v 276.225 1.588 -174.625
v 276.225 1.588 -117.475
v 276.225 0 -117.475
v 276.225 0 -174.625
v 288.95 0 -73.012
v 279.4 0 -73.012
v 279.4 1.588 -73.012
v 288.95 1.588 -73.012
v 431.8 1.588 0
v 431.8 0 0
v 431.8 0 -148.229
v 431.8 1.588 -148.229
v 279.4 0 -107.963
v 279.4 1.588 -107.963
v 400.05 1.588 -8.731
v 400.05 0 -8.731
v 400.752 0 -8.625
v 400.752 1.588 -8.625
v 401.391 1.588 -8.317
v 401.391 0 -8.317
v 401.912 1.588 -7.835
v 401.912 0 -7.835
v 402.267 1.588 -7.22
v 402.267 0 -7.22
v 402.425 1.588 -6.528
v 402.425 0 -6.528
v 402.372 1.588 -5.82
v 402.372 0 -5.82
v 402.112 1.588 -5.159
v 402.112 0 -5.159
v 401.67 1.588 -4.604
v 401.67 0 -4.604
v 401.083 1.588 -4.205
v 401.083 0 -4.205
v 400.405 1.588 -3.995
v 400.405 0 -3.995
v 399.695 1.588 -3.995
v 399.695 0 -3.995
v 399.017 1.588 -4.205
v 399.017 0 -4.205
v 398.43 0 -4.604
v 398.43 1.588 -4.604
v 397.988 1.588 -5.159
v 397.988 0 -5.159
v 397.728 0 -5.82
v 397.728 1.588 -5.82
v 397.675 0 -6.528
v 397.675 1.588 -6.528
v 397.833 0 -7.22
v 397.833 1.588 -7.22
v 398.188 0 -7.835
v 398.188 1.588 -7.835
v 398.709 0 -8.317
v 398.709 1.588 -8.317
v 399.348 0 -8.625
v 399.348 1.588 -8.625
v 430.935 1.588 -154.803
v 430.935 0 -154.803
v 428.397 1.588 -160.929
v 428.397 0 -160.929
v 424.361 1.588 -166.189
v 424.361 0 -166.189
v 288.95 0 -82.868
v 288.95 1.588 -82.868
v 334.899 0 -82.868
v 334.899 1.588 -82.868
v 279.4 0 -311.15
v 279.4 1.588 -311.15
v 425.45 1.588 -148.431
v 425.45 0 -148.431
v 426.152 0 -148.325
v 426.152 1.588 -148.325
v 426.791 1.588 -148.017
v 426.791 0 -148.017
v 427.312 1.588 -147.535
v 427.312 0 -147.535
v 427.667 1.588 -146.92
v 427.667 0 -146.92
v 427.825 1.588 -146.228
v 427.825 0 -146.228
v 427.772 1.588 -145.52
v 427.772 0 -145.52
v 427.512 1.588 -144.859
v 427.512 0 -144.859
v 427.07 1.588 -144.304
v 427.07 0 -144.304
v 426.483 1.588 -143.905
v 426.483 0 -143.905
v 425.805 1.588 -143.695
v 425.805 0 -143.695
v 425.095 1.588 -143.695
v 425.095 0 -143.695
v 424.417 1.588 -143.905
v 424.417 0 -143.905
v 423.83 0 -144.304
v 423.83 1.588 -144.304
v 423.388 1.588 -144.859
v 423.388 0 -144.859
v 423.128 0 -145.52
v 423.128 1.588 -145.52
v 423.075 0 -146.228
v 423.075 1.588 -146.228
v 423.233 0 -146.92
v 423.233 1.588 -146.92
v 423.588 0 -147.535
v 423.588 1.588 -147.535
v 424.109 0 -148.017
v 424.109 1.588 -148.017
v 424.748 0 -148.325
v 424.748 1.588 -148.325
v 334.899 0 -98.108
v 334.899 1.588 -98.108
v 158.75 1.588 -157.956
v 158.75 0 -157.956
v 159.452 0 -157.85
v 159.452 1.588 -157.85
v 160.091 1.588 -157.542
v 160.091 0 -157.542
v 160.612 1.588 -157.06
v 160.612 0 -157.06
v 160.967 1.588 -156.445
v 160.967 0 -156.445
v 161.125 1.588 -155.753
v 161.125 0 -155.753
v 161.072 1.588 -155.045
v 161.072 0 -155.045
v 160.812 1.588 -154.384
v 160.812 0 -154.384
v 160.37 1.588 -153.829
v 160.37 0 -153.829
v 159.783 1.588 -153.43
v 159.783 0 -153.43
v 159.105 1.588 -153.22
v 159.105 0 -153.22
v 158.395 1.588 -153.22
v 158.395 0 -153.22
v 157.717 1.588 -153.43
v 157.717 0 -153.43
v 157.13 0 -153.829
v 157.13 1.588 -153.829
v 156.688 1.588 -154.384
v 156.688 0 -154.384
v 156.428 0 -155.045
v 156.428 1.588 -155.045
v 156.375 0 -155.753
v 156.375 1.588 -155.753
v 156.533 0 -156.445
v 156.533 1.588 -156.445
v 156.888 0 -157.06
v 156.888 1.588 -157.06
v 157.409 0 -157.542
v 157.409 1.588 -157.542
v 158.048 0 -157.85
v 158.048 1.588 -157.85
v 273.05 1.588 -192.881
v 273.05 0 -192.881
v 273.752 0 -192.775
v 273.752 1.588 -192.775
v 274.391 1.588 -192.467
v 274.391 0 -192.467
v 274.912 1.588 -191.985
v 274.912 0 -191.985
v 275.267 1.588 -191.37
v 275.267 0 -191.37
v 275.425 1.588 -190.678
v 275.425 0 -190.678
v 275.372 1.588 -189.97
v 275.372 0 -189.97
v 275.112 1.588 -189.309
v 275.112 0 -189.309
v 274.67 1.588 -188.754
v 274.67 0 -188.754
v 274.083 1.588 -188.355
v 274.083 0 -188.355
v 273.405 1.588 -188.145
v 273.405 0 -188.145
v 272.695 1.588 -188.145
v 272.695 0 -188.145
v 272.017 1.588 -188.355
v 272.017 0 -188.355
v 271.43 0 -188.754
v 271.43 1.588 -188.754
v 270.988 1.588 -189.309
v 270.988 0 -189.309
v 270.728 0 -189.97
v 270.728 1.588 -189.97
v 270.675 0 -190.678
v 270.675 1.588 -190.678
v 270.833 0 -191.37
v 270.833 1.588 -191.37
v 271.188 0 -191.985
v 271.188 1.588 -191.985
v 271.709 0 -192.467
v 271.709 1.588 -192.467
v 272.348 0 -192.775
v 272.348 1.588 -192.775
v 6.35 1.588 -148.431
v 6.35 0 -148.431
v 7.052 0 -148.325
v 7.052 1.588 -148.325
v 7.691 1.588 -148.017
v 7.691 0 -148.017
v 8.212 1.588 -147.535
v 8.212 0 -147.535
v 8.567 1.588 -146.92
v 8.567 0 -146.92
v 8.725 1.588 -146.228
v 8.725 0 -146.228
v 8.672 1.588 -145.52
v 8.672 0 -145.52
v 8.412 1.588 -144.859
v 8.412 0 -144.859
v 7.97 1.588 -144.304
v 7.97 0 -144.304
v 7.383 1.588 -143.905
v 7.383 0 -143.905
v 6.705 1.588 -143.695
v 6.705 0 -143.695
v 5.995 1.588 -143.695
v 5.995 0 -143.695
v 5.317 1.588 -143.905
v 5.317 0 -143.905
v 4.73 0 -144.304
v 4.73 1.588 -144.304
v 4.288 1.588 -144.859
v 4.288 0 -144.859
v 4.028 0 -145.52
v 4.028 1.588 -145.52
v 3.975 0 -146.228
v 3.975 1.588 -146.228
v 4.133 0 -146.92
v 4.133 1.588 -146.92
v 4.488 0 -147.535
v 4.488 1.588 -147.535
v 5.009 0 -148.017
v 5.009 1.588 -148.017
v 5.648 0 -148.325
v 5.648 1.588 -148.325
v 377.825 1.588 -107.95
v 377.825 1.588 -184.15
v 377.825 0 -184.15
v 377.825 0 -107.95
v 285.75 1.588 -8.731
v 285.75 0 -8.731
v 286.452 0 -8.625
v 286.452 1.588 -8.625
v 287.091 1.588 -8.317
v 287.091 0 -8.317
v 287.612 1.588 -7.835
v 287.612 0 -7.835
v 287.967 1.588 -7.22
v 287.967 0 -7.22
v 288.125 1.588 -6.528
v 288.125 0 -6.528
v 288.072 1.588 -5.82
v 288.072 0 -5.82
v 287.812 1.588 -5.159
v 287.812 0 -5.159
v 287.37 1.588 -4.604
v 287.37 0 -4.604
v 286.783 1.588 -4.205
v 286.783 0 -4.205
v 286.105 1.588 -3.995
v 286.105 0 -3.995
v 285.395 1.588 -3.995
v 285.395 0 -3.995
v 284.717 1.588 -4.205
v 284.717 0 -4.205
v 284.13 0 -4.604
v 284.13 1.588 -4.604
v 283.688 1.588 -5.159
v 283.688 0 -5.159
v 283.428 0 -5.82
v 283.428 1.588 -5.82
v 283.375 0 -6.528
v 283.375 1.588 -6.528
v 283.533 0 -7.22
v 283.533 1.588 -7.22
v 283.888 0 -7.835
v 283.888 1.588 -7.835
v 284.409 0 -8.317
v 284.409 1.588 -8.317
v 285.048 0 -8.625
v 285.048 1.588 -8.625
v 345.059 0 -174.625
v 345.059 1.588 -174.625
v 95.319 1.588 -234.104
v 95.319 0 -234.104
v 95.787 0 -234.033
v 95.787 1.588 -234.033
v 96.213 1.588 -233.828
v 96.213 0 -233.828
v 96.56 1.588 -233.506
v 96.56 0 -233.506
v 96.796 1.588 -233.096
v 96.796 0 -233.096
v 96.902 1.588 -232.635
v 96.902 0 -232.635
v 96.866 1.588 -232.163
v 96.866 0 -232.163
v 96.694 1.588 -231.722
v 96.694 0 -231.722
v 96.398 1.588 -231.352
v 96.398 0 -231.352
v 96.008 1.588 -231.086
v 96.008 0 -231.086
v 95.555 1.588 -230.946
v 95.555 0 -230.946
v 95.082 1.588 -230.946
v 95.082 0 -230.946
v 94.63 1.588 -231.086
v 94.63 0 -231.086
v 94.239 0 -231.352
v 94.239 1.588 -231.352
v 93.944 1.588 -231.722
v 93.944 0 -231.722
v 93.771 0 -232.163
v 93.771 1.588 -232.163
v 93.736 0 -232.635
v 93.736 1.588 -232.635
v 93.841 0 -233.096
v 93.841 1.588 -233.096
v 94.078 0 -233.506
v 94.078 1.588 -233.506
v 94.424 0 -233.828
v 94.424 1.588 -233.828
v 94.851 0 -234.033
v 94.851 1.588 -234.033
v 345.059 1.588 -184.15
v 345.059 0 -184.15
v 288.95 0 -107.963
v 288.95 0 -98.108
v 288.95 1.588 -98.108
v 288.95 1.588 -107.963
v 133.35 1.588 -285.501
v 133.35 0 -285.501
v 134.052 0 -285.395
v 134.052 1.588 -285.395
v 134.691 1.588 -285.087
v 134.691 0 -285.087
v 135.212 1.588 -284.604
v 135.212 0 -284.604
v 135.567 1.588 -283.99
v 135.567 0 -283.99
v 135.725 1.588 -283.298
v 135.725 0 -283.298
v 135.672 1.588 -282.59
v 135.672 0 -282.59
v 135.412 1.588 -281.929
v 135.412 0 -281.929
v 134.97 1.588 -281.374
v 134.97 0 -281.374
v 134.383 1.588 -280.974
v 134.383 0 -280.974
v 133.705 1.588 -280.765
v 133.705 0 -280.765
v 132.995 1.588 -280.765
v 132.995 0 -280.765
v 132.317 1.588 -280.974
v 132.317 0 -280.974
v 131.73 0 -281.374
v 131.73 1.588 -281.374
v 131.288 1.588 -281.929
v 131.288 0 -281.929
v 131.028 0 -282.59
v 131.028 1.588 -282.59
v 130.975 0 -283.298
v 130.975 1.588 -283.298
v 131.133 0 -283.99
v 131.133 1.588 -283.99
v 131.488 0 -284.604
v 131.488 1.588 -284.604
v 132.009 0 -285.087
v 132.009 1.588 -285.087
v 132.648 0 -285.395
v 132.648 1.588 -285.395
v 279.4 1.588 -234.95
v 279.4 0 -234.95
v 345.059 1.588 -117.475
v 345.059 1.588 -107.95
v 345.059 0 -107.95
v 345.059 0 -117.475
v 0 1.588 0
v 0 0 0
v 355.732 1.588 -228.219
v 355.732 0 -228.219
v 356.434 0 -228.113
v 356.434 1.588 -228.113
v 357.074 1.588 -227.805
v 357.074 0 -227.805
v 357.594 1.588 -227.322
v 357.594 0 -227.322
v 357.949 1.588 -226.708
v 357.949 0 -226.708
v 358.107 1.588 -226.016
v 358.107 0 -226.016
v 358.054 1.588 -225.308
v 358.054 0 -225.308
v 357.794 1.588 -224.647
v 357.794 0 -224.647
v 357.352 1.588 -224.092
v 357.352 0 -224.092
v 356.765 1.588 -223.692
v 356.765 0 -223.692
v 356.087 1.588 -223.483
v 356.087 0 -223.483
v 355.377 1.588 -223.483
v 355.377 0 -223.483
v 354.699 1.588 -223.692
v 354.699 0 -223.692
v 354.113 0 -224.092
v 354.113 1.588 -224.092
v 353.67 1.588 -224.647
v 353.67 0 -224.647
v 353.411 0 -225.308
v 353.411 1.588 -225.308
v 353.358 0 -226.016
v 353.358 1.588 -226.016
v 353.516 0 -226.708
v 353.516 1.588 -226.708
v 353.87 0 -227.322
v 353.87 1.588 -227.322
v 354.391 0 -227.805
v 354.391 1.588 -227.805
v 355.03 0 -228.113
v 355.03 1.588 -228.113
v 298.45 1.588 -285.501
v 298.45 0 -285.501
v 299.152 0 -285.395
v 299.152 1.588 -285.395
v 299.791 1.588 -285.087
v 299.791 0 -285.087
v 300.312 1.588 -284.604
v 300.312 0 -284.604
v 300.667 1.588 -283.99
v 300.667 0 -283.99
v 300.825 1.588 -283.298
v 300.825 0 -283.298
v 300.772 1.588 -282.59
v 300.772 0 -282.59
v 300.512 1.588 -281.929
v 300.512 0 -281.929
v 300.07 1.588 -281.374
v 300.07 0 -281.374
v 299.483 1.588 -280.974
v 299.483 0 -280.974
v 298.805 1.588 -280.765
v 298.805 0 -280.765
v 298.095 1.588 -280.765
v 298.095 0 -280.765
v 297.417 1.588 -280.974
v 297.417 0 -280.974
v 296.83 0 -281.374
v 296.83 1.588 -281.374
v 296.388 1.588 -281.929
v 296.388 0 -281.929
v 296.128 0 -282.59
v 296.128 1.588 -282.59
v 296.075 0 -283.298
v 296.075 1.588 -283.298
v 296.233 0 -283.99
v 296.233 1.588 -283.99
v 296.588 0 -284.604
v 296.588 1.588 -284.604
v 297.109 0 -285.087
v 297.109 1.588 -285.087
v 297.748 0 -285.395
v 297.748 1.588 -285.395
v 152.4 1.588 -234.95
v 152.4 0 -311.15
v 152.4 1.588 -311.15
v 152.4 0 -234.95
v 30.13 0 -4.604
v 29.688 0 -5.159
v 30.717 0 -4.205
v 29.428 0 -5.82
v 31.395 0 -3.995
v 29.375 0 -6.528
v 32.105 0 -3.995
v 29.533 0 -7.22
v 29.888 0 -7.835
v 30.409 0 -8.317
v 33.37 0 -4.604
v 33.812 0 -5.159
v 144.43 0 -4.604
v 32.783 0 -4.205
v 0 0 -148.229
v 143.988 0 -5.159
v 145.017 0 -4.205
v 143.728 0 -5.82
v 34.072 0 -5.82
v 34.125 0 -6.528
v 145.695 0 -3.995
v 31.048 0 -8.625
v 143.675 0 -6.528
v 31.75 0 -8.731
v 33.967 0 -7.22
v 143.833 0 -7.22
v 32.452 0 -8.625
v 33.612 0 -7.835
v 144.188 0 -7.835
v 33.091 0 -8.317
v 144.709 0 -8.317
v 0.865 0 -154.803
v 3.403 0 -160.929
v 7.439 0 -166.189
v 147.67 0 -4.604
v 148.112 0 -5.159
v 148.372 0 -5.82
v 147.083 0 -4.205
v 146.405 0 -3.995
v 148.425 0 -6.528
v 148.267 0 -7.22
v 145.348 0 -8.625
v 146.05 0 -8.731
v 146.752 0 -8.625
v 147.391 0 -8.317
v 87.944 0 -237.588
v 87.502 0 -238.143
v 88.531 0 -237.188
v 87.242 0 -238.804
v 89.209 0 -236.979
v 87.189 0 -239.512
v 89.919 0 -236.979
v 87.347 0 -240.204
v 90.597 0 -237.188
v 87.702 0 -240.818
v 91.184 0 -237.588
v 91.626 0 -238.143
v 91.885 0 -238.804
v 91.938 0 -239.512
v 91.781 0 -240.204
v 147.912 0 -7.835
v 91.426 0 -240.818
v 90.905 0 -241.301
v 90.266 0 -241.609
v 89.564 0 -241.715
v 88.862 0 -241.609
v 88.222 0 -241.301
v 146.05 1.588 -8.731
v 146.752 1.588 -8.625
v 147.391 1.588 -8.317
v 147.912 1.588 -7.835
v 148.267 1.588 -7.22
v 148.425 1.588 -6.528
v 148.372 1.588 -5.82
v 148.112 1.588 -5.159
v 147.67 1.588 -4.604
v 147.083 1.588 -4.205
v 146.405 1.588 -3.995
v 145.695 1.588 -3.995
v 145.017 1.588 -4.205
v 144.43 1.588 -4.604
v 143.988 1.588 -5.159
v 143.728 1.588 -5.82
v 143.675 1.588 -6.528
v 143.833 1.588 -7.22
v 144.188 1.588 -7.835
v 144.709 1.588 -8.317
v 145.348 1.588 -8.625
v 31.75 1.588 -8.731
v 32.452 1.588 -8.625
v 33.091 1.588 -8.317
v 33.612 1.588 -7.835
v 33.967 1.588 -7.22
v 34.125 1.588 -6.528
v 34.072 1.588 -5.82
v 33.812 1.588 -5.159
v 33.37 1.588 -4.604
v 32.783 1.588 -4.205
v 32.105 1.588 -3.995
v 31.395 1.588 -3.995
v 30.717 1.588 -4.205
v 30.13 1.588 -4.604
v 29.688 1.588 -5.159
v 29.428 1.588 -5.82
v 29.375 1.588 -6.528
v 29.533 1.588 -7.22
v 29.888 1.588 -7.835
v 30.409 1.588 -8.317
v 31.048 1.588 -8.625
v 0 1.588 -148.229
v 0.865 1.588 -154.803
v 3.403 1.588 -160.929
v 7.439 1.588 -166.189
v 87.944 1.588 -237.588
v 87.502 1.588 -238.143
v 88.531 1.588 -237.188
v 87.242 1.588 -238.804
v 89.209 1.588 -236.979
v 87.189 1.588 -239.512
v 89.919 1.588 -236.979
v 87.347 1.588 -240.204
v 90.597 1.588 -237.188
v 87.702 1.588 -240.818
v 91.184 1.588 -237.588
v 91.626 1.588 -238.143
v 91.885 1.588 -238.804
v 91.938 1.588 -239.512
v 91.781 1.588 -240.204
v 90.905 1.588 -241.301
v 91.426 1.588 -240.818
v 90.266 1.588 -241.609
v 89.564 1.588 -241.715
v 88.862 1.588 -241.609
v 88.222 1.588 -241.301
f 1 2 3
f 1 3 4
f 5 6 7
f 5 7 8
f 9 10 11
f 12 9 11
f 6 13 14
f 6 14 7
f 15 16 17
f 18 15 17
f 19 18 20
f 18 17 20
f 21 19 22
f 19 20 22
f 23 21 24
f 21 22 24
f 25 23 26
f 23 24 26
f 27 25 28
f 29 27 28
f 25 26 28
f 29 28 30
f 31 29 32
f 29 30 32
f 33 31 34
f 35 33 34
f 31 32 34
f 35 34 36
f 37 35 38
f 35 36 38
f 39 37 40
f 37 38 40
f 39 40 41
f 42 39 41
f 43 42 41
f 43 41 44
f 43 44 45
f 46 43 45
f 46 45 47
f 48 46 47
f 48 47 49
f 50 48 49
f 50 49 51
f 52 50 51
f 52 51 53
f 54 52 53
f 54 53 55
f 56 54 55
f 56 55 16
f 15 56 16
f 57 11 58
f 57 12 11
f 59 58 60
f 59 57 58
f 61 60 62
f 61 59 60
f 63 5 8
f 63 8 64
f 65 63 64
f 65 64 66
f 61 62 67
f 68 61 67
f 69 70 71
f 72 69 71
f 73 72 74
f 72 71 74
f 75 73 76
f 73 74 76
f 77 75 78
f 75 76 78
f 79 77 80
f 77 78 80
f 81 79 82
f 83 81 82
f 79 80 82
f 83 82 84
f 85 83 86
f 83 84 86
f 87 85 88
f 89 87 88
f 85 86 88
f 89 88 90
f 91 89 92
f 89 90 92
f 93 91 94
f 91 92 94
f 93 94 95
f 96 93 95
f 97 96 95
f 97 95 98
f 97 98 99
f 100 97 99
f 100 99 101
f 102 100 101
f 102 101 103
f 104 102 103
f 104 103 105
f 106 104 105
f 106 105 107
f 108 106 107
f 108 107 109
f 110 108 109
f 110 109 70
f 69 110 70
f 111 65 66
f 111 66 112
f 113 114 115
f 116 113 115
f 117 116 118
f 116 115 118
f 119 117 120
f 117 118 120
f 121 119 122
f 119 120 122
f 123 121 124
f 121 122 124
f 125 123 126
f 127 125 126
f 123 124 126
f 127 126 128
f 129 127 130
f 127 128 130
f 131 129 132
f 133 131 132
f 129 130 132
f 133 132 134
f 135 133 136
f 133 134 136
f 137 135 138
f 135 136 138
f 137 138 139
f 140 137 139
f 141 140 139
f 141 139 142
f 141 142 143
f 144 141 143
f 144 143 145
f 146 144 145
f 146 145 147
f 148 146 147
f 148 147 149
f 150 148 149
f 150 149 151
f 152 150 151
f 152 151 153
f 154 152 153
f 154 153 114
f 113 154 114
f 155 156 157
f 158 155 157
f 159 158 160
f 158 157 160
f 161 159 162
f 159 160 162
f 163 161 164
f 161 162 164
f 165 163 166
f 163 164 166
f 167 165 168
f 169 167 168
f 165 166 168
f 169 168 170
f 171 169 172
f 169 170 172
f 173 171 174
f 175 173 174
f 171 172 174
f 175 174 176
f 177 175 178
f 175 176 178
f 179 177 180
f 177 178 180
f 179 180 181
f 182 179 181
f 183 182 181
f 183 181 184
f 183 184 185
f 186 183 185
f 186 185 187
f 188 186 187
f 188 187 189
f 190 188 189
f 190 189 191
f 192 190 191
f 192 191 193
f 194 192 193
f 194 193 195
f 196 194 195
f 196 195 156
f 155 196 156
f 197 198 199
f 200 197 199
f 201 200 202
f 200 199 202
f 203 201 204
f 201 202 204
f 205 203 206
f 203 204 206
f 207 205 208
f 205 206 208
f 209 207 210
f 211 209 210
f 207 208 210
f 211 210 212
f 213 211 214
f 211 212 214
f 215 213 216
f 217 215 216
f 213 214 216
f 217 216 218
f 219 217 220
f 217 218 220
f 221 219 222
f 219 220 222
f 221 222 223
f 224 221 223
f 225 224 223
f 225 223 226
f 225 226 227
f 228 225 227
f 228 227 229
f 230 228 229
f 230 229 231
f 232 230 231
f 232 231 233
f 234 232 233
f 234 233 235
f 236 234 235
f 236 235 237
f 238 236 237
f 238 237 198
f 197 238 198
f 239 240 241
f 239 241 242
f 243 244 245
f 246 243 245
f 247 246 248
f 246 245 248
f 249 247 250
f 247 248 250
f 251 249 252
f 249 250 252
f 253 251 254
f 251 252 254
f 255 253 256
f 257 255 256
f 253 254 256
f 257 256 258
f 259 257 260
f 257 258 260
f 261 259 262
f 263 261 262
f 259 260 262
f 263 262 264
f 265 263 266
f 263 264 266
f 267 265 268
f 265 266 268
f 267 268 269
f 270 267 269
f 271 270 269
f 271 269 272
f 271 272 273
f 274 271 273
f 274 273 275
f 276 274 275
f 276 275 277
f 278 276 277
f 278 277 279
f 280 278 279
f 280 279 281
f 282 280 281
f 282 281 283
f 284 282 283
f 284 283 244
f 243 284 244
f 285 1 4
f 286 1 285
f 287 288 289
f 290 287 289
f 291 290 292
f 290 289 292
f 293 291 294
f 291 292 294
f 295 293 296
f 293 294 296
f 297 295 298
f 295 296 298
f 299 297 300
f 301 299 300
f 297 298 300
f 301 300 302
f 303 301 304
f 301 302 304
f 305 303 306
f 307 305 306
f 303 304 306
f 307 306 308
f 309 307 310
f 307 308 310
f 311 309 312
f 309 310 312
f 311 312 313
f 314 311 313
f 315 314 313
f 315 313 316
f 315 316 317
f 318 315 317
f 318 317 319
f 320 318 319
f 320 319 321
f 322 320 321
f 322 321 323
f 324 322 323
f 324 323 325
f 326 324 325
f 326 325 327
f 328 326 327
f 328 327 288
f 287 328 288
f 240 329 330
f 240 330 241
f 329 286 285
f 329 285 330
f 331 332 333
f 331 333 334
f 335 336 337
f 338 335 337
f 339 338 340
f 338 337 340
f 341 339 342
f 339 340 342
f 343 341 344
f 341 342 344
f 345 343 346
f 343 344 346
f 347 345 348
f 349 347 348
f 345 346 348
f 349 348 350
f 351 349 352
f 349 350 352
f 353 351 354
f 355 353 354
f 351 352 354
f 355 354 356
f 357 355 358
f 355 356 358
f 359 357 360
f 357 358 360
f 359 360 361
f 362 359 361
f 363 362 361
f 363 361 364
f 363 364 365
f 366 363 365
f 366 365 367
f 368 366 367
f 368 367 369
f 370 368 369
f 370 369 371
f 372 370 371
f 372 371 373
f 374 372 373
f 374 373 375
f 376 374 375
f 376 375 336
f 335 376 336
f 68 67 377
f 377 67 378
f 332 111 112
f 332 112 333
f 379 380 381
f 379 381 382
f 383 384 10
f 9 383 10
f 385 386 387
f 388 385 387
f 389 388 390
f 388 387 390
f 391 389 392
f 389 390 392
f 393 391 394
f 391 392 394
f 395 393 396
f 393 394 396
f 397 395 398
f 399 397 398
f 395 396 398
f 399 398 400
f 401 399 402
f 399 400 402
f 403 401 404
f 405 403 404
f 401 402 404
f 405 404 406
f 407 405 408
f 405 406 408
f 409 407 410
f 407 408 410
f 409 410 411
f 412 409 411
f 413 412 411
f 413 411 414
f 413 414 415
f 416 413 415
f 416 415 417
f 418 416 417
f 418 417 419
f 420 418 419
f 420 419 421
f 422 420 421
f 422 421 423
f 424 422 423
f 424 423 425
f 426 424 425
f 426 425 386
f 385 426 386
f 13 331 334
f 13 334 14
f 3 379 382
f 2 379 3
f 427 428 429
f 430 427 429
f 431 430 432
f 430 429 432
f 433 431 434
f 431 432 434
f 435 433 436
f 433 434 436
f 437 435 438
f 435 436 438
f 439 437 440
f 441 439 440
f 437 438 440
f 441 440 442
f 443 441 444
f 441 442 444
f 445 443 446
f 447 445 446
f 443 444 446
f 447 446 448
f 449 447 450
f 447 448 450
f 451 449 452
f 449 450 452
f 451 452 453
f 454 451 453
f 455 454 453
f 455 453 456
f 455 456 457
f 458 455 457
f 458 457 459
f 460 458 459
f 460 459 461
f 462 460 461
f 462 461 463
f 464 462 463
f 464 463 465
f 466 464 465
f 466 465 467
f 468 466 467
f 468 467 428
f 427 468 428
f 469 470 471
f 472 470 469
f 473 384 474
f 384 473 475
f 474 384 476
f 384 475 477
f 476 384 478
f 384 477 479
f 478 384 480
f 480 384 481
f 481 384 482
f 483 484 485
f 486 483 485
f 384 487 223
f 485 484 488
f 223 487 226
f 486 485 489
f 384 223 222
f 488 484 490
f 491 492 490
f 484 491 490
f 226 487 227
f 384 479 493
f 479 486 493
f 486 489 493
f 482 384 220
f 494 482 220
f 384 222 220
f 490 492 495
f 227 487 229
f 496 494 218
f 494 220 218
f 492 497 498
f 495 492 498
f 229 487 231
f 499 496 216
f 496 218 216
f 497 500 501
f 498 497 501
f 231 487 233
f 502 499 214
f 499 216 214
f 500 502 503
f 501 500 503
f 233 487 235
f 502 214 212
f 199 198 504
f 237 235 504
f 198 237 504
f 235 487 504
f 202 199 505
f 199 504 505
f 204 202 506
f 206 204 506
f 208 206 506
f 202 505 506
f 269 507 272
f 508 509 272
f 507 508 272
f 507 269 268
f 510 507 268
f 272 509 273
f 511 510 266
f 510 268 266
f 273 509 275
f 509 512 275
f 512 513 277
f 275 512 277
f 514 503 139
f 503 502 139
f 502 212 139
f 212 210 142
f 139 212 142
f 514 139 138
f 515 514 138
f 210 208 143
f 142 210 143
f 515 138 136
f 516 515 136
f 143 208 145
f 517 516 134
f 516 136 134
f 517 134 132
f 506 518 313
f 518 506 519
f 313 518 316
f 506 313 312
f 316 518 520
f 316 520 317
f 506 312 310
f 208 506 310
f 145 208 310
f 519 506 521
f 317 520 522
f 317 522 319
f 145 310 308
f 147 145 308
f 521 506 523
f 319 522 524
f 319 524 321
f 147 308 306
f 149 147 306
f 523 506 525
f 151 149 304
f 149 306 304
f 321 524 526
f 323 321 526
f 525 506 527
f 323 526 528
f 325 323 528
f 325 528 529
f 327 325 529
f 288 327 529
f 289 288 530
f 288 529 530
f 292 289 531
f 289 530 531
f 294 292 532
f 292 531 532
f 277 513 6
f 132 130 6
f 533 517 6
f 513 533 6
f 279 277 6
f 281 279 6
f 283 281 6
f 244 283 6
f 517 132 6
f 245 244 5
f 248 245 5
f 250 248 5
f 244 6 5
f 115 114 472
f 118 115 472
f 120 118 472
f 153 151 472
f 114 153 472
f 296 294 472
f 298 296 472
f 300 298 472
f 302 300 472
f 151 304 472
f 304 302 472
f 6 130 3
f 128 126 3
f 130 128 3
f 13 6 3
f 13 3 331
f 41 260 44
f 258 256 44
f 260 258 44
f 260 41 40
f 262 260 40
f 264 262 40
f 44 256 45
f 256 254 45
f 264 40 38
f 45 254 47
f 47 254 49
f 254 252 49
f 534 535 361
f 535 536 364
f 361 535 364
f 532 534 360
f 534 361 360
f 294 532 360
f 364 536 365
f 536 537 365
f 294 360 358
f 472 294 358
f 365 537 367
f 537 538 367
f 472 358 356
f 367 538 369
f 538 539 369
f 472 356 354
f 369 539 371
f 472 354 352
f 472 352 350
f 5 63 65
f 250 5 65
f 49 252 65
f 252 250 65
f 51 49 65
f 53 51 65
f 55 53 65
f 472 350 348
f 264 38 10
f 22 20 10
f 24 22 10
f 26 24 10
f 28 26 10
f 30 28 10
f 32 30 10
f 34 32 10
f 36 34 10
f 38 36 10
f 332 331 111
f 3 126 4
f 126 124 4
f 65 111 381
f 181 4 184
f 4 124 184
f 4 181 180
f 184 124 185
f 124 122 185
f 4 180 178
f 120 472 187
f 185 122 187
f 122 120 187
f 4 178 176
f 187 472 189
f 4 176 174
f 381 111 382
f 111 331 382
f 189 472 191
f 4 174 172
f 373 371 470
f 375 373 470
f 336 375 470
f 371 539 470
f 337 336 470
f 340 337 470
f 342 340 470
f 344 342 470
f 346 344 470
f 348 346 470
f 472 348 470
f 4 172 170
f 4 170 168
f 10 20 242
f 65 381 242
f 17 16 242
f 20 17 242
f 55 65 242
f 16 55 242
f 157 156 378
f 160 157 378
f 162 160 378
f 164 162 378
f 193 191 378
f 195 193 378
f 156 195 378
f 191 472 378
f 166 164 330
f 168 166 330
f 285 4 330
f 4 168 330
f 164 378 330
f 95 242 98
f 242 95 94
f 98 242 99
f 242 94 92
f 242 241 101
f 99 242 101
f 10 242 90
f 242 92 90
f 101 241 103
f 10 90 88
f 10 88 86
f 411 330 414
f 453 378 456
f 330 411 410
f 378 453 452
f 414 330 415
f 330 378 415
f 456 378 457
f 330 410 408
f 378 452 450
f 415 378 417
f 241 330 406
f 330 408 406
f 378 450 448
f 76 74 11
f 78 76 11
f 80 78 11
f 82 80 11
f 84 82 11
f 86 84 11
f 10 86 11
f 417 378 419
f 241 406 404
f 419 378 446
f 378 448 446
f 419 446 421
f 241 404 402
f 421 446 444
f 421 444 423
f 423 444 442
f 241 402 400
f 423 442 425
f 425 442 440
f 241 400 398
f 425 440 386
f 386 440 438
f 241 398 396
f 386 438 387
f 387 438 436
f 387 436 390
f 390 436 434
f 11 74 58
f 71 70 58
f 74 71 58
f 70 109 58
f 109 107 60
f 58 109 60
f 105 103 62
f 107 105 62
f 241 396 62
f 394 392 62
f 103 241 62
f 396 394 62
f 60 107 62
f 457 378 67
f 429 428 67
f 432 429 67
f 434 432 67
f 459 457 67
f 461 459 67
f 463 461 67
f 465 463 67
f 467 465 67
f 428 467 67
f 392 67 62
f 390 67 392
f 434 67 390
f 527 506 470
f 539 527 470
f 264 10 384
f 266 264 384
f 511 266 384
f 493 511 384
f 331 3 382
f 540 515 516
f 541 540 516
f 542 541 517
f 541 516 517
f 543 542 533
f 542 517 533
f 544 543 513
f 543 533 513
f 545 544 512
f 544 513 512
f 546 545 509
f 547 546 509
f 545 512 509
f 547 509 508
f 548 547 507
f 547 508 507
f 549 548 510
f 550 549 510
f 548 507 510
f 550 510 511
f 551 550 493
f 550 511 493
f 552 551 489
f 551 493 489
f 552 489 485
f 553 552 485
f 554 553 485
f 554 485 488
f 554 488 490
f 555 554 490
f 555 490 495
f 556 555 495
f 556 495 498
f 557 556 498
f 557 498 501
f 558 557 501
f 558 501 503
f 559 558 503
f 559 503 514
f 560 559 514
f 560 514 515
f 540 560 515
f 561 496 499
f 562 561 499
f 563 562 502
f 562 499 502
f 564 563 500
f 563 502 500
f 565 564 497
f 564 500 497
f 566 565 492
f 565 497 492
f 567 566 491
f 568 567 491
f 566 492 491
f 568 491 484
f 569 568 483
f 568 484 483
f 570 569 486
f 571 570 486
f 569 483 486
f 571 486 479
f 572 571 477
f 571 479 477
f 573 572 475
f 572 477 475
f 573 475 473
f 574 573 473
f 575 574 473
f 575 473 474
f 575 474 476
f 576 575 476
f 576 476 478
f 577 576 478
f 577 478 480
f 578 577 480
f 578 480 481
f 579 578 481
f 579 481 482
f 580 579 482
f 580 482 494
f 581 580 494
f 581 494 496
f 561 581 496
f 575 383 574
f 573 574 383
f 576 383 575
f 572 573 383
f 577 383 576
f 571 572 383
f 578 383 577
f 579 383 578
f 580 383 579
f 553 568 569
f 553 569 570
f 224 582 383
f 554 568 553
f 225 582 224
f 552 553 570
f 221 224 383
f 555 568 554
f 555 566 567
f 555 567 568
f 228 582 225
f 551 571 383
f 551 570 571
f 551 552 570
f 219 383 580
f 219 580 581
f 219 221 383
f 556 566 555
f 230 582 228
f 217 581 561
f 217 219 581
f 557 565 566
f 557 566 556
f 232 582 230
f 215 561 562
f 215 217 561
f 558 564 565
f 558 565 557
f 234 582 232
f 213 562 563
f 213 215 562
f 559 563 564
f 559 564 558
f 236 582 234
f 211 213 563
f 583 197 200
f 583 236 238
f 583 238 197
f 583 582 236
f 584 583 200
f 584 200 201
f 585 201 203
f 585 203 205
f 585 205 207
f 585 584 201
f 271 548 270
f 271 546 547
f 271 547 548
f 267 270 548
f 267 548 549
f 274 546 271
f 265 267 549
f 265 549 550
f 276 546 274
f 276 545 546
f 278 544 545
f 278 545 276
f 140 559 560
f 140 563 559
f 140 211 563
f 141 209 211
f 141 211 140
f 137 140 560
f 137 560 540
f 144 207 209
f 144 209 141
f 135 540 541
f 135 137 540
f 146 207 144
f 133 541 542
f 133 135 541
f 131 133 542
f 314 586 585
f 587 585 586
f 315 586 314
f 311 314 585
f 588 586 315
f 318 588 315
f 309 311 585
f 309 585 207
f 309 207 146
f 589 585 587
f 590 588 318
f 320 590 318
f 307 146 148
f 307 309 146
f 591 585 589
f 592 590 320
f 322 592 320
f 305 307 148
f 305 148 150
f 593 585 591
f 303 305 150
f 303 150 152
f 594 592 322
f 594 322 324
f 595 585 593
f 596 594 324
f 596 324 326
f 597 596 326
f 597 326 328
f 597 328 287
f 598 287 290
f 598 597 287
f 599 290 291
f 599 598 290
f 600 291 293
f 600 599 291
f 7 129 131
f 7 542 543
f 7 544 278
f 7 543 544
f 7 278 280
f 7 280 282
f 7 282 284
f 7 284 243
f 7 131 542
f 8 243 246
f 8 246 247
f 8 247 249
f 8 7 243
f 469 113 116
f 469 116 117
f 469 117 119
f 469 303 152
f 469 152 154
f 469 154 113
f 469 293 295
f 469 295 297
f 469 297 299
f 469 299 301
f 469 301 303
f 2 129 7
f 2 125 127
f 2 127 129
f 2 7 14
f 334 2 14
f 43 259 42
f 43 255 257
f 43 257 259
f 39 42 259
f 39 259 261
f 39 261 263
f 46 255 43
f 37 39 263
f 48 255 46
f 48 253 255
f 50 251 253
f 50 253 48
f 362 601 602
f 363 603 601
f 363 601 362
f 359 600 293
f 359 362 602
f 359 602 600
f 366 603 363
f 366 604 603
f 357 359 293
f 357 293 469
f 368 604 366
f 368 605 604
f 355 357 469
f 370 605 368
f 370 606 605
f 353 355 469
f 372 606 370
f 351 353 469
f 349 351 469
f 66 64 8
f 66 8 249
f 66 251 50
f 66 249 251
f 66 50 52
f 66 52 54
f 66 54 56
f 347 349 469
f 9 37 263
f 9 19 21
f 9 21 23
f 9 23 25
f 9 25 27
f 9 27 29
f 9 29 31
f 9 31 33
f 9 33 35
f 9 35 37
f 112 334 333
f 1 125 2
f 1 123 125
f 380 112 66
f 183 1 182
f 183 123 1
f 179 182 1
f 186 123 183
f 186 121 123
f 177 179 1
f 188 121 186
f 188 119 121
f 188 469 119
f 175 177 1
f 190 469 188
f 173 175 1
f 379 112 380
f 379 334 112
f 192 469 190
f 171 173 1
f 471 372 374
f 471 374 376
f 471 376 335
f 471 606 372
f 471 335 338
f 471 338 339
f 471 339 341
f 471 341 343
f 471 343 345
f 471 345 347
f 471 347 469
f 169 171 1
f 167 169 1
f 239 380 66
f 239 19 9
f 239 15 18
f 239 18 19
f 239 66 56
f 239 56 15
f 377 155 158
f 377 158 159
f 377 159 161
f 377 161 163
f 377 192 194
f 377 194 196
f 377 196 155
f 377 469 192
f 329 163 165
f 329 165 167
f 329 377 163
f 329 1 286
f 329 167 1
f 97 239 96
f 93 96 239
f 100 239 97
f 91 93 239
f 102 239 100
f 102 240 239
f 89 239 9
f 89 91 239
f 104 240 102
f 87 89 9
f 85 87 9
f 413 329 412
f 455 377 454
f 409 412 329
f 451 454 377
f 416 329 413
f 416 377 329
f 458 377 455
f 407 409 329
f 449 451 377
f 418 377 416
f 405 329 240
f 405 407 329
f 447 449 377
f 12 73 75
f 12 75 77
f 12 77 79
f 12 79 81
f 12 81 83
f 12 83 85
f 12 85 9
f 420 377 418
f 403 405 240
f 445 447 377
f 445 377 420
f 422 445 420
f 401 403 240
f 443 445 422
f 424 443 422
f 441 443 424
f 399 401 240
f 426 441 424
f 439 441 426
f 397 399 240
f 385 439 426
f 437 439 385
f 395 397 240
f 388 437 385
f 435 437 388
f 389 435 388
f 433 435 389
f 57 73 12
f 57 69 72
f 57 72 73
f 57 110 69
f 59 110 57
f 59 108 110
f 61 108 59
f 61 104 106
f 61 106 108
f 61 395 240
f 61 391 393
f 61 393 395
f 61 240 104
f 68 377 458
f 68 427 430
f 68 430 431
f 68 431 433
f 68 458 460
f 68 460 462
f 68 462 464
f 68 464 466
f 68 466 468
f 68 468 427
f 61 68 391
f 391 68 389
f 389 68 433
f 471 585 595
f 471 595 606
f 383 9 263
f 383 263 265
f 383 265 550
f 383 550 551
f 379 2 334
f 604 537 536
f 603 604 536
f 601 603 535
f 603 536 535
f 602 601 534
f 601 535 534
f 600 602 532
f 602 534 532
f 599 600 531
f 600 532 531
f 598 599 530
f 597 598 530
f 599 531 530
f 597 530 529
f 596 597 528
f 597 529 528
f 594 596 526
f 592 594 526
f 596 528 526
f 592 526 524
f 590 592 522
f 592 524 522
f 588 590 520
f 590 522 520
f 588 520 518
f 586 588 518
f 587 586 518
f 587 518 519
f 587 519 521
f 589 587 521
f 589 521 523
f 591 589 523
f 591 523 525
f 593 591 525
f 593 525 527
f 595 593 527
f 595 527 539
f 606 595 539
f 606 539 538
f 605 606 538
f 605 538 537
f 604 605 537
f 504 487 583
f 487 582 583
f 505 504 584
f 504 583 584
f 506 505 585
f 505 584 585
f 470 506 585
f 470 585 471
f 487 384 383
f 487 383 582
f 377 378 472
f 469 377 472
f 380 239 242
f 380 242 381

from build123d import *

# Parameters (mm, degrees)
EXTRUDE1_DEPTH     = 1.5875
MIRROR1_DEPTH      = 1.5875
CUT_EXTRUDE1_REACH = 534.229
SKETCH3_R          = 1.5875
CUT_EXTRUDE2_DEPTH = 533.229351555
SKETCH4_R          = 2.38125
SKETCH4_R_2        = 2.381250001
CUT_EXTRUDE3_DEPTH = 533.229351555
CUT_EXTRUDE4_DEPTH = 533.229351555
FILLET1_R          = 25.4


# Read off the part's stored shape, not the designer's step: Mirror1
with BuildPart() as part:
    # Sketch1 → Extrude1 (new body)
    with BuildSketch(Plane(origin=(0, 0, 0), x_dir=(1, 0, 0), z_dir=(0, 1, 0))):
        Polygon((0, 0), (0, 158.75), (152.4, 311.15), (152.4, 234.95), (215.9, 234.95), (215.9, 0), align=None)
    extrude(amount=EXTRUDE1_DEPTH)

    # Mirror1 outline → Mirror1 (add)
    with BuildSketch(Plane(origin=(0, 0, 0), x_dir=(1, 0, 0), z_dir=(0, 1, 0))):
        Polygon((215.9, 0), (431.8, 0), (431.8, 158.75), (279.4, 311.15), (279.4, 234.95), (215.9, 234.95), align=None)
    extrude(amount=MIRROR1_DEPTH)

    # Sketch2 → Cut-Extrude1 (cut, up to next)
    with BuildSketch(Plane(origin=(0, 1.5875, 0), x_dir=(-1, 0, 0), z_dir=(0, 1, 0)), mode=Mode.PRIVATE) as cut_extrude1_sk1:
        Polygon((-276.225, -174.625), (-345.059, -174.625), (-345.059, -184.15), (-377.825, -184.15), (-377.825, -107.95), (-345.059, -107.95), (-345.059, -117.475), (-276.225, -117.475), align=None)
    cut_extrude1_tool1 = extrude(cut_extrude1_sk1.sketch, amount=-CUT_EXTRUDE1_REACH, mode=Mode.PRIVATE) & part.part
    add(cut_extrude1_tool1.solids().sort_by_distance((330.365702, 1.5875, -146.05))[0], mode=Mode.SUBTRACT)

    # Sketch3 → Cut-Extrude2 (cut, through all)
    with BuildSketch(Plane.XZ):
        with Locations(Location((95.31871999, -232.5161053, 0), (0, 0, 270))):
            Circle(SKETCH3_R)
    extrude(amount=-CUT_EXTRUDE2_DEPTH, mode=Mode.SUBTRACT)

    # Sketch4 → Cut-Extrude3 (cut, through all)
    with BuildSketch(Plane.XZ):
        with Locations(Location((133.35, -283.119743879, 0), (0, 0, 270))):
            Circle(SKETCH4_R)
        with Locations(Location((273.05, -190.5, 0), (0, 0, 270))):
            Circle(SKETCH4_R)
        with Locations(Location((158.75, -155.575, 0), (0, 0, 270))):
            Circle(SKETCH4_R)
        with Locations(Location((298.45, -283.119743879, 0), (0, 0, 270))):
            Circle(SKETCH4_R)
        with Locations(Location((355.732177028, -225.837566851, 0), (0, 0, 270))):
            Circle(SKETCH4_R_2)
        with Locations(Location((425.45, -146.05, 0), (0, 0, 270))):
            Circle(SKETCH4_R)
        with Locations(Location((400.05, -6.35, 0), (0, 0, 270))):
            Circle(SKETCH4_R)
        with Locations(Location((31.75, -6.35, 0), (0, 0, 270))):
            Circle(SKETCH4_R)
        with Locations(Location((146.05, -6.35, 0), (0, 0, 270))):
            Circle(SKETCH4_R)
        with Locations(Location((285.75, -6.35, 0), (0, 0, 270))):
            Circle(SKETCH4_R)
        with Locations(Location((6.35, -146.05, 0), (0, 0, 270))):
            Circle(SKETCH4_R)
        with Locations(Location((89.563891484, -239.333635363, 0), (0, 0, 270))):
            Circle(SKETCH4_R)
    extrude(amount=-CUT_EXTRUDE3_DEPTH, mode=Mode.SUBTRACT)

    # Sketch5 → Cut-Extrude4 (cut, through all)
    with BuildSketch(Plane.XZ):
        Polygon((279.4, -107.9627), (279.4, -73.0123), (288.9504, -73.0123), (288.9504, -82.8675), (334.899, -82.8675), (334.899, -98.1075), (288.9504, -98.1075), (288.9504, -107.9627), align=None)
    extrude(amount=-CUT_EXTRUDE4_DEPTH, mode=Mode.SUBTRACT)

    # Fillet1
    fillet1_edges = [part.edges().sort_by_distance(p)[0] for p in [
        (0, 0.79375, -158.75),
        (431.8, 0.79375, -158.75),
    ]]
    fillet(fillet1_edges, radius=FILLET1_R)


solid = part.part
